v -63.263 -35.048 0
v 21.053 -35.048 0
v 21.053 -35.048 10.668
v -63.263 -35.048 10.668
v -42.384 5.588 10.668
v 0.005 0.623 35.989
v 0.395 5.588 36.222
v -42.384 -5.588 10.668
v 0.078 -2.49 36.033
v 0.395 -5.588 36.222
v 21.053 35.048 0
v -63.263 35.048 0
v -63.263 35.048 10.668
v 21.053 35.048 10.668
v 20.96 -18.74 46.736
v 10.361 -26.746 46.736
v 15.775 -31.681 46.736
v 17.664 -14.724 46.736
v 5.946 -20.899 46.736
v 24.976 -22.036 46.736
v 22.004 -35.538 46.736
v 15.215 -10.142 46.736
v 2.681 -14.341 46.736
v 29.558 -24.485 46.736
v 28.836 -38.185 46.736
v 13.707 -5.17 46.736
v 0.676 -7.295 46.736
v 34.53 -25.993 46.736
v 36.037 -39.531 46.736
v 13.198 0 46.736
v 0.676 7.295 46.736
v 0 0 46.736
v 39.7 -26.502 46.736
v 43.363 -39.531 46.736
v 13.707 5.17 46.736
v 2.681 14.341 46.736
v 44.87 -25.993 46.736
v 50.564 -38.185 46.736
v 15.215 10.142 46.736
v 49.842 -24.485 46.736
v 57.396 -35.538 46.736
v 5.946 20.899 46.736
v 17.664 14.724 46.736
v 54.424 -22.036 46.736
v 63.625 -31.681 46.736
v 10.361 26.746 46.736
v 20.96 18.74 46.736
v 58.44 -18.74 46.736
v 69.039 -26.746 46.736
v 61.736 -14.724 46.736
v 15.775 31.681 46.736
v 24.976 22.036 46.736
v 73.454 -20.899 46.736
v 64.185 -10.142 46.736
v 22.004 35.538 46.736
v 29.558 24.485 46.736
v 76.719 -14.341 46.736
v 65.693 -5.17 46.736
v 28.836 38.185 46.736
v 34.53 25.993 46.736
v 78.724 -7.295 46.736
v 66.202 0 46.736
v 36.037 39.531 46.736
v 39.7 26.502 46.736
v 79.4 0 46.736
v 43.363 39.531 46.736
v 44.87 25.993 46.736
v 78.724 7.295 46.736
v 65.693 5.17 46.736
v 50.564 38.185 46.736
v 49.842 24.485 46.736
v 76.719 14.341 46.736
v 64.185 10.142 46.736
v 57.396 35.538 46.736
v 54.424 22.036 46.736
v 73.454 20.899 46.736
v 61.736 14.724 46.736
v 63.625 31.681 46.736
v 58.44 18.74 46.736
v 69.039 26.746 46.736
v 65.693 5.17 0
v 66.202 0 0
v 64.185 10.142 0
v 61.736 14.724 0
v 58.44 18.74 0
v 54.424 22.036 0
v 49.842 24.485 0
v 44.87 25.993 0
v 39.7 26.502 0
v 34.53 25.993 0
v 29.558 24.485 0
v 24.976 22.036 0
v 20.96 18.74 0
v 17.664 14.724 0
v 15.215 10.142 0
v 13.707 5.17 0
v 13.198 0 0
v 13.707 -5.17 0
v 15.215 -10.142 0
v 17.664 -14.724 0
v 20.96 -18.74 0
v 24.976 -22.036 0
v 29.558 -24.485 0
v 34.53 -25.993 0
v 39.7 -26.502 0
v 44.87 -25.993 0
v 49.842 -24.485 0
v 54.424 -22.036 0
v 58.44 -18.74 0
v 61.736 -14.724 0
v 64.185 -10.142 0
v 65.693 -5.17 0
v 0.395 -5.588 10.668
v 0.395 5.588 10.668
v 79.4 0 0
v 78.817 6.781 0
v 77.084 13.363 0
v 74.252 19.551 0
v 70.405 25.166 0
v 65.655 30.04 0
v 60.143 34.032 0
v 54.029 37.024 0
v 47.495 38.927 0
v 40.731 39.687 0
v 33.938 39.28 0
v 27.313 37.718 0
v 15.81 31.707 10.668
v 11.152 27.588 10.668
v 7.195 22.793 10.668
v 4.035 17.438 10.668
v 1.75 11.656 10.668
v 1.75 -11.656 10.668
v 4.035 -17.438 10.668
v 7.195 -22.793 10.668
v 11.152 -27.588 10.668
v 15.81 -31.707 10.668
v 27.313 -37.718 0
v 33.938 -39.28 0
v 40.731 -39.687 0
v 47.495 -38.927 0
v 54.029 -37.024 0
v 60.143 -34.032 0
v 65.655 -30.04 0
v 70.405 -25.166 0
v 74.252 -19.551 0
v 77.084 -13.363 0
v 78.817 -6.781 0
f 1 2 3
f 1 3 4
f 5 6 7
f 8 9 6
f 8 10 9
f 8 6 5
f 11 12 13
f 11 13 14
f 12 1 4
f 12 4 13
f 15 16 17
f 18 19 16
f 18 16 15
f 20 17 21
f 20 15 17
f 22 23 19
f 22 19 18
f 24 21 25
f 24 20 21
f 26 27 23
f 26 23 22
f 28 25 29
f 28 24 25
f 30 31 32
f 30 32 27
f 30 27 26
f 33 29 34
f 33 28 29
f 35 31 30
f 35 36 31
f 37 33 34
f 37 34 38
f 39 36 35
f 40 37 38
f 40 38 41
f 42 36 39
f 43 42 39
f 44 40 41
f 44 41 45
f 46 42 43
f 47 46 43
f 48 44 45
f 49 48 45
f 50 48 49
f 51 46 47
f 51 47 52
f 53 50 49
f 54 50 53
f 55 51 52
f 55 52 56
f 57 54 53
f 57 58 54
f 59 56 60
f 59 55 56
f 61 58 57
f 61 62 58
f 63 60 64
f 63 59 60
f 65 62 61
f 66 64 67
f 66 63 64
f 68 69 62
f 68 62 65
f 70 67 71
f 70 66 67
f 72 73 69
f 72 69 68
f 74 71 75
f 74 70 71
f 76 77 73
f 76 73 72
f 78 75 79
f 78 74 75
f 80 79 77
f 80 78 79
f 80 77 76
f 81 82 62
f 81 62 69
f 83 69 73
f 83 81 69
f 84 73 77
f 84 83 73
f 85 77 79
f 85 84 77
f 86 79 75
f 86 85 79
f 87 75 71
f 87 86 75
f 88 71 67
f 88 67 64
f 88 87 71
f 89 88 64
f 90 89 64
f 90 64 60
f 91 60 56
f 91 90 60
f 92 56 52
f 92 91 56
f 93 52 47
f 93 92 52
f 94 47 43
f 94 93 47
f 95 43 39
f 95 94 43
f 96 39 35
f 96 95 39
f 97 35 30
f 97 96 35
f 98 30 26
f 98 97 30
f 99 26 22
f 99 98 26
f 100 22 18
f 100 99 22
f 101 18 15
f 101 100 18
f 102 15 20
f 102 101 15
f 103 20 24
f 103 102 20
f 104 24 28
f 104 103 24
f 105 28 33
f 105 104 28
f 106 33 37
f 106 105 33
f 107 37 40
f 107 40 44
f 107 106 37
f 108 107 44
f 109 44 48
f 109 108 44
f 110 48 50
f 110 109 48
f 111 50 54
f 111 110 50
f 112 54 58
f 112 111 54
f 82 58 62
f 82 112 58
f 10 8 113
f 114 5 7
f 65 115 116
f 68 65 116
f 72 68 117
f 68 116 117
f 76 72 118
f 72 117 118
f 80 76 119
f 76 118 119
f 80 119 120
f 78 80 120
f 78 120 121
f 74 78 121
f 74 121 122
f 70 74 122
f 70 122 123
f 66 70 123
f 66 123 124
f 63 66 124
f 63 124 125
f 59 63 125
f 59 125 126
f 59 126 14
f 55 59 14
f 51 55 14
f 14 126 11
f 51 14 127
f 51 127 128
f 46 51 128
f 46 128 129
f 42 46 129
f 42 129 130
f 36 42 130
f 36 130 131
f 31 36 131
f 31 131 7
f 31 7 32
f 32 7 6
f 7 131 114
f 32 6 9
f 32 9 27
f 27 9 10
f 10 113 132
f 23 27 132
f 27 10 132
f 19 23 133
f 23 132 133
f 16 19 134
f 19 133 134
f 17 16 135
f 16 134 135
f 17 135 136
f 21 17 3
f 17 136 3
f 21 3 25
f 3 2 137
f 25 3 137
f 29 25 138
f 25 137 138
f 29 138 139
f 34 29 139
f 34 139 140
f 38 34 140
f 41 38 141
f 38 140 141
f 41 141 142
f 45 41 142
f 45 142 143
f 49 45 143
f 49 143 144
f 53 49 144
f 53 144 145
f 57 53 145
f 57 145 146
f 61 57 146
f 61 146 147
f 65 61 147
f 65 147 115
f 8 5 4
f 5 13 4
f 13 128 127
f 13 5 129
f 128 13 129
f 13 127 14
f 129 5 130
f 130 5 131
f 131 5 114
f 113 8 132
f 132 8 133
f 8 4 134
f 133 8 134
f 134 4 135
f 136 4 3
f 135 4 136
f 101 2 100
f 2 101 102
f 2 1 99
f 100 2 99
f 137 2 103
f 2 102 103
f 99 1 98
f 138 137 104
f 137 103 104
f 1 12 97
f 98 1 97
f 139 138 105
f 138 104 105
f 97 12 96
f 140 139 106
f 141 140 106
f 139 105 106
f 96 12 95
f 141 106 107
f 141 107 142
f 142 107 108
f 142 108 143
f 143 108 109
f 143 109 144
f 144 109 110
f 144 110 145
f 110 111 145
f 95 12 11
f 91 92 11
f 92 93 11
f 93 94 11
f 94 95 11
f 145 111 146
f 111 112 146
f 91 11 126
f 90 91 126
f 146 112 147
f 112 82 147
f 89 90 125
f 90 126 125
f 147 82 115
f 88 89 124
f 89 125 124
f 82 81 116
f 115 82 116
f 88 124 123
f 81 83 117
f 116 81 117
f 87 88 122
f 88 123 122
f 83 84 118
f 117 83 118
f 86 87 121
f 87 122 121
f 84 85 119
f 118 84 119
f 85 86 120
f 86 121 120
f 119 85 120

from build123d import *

# Parameters (mm, degrees)
F0_R     = 39.700031
F0_R_2   = 26.502297
F1_DEPTH = 46.736
F3_DEPTH = 10.668
F5_DEPTH = 5.588


with BuildPart() as f1:
    # F0 (on Top) → F1 (new body)
    with BuildSketch(Plane.XY):
        with Locations((39.700031, 0)):
            Circle(F0_R)
        with Locations((39.700031, 0)):
            Circle(F0_R_2, mode=Mode.SUBTRACT)
    extrude(amount=F1_DEPTH)

    # F2 (on face) → F3 (join)
    with BuildSketch(Plane(origin=(0, 0, 0), x_dir=(1, 0, 0), z_dir=(0, 0, -1))):
        with BuildLine():
            Line((-63.262849, -35.048185), (21.052854, -35.048185))
            ThreePointArc((21.052854, -35.048185), (0, 0), (21.052854, 35.048185))
            Line((21.052854, 35.048185), (-63.262849, 35.048185))
            Line((-63.262849, 35.048185), (-63.262849, -35.048185))
        make_face()
    extrude(amount=-F3_DEPTH)

    # F4 (on Front) → F5 (join, symmetric)
    with BuildSketch(Plane.XZ):
        Polygon((4.870512, 38.895372), (-47.924407, 7.358584), (4.870512, 6.657766), align=None)
    extrude(amount=F5_DEPTH, both=True)


solid = f1.part
